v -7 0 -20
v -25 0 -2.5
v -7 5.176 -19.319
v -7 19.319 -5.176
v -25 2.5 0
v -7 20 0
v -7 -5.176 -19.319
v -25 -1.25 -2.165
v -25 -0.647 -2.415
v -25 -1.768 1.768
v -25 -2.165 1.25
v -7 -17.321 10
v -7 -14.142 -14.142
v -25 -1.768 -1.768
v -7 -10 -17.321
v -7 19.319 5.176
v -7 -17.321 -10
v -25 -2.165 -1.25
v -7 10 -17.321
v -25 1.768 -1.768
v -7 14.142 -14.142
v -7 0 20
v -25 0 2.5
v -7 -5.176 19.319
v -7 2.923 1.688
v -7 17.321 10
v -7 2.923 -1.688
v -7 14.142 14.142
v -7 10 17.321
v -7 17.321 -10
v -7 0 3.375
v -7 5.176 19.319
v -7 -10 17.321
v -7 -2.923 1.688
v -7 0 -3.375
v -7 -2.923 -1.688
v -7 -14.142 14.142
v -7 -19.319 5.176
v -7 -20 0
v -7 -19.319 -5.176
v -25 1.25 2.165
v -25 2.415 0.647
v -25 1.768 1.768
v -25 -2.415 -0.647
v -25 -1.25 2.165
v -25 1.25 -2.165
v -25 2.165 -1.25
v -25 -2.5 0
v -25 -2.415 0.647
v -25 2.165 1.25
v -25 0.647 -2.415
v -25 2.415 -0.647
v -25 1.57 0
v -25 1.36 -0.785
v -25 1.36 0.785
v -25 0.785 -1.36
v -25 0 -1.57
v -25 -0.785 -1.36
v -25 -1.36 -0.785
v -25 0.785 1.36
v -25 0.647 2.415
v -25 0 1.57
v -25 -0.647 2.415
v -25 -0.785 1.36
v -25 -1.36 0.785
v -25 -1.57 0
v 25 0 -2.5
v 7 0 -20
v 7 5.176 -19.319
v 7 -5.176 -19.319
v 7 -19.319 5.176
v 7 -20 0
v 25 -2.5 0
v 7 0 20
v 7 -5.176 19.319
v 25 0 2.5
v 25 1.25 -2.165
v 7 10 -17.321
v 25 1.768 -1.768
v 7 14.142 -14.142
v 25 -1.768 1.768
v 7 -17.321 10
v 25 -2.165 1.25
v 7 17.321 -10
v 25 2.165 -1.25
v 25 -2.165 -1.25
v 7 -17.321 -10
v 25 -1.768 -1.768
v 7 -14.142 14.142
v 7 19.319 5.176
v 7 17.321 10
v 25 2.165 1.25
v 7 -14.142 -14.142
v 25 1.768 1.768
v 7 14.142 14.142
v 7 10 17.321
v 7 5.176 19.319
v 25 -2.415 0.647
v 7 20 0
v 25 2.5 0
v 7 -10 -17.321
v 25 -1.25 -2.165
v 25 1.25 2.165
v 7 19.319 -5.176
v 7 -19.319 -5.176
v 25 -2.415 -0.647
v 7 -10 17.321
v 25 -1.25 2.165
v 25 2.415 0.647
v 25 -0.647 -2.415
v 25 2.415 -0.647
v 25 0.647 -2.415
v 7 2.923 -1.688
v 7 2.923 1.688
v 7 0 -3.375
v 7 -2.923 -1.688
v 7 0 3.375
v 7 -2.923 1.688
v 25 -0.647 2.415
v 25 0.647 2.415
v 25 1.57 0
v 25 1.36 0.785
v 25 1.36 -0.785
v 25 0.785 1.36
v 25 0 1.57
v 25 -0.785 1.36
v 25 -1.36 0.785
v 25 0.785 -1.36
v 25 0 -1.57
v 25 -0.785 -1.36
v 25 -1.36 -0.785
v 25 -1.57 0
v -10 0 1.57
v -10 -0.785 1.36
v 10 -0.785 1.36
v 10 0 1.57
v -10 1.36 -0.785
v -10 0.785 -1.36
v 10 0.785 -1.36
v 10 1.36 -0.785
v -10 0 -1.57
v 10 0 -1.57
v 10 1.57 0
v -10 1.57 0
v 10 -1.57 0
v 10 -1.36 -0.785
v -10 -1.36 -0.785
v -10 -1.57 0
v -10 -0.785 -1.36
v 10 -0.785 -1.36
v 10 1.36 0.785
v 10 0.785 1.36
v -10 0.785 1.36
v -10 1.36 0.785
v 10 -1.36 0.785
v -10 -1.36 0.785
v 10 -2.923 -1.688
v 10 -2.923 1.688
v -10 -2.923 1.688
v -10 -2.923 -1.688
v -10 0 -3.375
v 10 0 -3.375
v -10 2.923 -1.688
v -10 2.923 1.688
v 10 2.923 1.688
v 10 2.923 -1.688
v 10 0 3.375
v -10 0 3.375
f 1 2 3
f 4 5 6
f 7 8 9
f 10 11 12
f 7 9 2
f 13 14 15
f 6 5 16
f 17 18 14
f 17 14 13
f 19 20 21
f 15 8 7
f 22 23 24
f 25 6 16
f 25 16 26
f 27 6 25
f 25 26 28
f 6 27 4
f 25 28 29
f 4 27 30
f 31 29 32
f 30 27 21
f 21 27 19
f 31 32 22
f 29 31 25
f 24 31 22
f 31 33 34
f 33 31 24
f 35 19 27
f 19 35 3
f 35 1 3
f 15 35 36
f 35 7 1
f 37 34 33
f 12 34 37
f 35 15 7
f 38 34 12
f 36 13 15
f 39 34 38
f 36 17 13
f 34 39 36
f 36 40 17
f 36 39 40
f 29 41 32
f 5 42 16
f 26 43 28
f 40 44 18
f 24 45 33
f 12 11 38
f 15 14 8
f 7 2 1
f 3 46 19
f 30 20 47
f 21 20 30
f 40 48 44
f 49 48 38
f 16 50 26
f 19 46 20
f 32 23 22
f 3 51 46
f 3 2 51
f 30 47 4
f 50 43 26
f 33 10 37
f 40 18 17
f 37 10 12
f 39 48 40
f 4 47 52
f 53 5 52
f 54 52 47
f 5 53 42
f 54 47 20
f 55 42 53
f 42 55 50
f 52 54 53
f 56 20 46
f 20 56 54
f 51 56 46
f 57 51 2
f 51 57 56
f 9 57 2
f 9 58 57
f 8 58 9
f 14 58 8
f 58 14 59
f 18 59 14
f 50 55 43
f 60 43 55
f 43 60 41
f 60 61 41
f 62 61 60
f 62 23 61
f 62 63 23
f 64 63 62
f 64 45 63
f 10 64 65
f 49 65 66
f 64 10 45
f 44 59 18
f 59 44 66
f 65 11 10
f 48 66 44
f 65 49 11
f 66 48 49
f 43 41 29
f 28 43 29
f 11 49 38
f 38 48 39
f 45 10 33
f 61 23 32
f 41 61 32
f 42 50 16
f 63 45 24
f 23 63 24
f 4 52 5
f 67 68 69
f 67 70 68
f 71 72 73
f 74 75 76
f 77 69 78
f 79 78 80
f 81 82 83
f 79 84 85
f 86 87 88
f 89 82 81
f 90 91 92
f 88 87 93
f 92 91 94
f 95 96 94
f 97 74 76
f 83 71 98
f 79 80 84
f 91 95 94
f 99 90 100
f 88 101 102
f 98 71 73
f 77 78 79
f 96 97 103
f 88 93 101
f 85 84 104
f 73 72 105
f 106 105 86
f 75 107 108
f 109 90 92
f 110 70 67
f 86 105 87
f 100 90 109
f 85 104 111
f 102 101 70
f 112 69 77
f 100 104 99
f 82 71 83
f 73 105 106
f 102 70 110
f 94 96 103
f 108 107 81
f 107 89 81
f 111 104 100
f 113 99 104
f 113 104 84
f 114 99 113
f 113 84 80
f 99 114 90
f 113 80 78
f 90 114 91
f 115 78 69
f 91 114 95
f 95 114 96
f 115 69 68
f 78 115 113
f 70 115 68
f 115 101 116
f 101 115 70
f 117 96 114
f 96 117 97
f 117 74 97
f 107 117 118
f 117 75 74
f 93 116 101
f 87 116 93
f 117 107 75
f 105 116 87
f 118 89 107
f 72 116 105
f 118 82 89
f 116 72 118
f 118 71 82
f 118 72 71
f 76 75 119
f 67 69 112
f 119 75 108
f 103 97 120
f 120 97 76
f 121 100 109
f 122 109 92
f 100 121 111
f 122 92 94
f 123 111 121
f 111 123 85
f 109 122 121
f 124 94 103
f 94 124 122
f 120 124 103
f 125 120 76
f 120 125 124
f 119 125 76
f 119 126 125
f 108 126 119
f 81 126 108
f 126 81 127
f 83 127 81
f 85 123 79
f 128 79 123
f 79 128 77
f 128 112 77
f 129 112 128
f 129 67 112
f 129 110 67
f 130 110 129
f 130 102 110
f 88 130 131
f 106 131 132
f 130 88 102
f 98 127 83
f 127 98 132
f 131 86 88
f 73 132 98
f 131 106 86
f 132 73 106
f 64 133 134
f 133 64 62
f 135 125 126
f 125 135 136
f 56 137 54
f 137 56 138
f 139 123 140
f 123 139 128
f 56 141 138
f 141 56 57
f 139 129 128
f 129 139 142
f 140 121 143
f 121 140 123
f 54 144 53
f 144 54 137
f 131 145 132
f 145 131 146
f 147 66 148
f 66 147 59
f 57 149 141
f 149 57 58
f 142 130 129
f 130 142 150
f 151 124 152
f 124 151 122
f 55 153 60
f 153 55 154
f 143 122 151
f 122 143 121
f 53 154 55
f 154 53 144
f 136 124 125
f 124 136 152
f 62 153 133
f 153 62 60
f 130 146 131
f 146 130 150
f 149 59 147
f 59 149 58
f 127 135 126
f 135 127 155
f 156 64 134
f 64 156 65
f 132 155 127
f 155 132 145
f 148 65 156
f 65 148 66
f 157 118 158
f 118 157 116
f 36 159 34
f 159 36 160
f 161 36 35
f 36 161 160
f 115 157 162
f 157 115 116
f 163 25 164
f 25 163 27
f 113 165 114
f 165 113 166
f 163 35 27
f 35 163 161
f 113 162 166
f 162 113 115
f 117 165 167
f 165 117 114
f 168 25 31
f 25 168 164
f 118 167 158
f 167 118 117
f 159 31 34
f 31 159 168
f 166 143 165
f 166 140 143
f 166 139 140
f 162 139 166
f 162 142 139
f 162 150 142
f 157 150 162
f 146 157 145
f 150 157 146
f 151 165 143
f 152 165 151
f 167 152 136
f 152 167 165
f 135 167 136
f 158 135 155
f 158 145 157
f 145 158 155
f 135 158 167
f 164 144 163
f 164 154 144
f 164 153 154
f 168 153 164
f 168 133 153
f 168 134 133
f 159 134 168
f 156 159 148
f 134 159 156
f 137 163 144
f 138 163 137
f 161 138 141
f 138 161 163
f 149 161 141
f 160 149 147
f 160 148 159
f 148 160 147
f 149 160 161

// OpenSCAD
//include <configuration.scad>;

// parameters for rod mount horns.
// these parameters should be the same for the carriage horns.
separation = 40+10;  // Distance between ball joint mounting faces.
cone_r1 = 2.5;
cone_r2 = 20;
cone_height=18;

module rodMountHorn() {
  for (s = [-1, 1]) scale([s, 1, 1])
    translate([separation/2-9, 0, 0]) rotate([0, 90, 0])
      cylinder(r1=cone_r2, r2=cone_r1, h=cone_height, center=true, $fn=24);
}

m3rad = 2.94/2;
m3nutRad = 5.5/cos(30)/2;

// boreLen is length of M3 bore before nut holder
module rodMountHornBore(fuzz=0.1,boreLen=15) {
  rotate([0,90,0]) {
    cylinder(r=m3rad+fuzz,h=separation+1,$fn=12,center=true);
    cylinder(r=m3nutRad+fuzz*2,h=separation-2*boreLen,$fn=6,center=true);
  }
}

difference() {
  rodMountHorn();
  #rodMountHornBore();
}
